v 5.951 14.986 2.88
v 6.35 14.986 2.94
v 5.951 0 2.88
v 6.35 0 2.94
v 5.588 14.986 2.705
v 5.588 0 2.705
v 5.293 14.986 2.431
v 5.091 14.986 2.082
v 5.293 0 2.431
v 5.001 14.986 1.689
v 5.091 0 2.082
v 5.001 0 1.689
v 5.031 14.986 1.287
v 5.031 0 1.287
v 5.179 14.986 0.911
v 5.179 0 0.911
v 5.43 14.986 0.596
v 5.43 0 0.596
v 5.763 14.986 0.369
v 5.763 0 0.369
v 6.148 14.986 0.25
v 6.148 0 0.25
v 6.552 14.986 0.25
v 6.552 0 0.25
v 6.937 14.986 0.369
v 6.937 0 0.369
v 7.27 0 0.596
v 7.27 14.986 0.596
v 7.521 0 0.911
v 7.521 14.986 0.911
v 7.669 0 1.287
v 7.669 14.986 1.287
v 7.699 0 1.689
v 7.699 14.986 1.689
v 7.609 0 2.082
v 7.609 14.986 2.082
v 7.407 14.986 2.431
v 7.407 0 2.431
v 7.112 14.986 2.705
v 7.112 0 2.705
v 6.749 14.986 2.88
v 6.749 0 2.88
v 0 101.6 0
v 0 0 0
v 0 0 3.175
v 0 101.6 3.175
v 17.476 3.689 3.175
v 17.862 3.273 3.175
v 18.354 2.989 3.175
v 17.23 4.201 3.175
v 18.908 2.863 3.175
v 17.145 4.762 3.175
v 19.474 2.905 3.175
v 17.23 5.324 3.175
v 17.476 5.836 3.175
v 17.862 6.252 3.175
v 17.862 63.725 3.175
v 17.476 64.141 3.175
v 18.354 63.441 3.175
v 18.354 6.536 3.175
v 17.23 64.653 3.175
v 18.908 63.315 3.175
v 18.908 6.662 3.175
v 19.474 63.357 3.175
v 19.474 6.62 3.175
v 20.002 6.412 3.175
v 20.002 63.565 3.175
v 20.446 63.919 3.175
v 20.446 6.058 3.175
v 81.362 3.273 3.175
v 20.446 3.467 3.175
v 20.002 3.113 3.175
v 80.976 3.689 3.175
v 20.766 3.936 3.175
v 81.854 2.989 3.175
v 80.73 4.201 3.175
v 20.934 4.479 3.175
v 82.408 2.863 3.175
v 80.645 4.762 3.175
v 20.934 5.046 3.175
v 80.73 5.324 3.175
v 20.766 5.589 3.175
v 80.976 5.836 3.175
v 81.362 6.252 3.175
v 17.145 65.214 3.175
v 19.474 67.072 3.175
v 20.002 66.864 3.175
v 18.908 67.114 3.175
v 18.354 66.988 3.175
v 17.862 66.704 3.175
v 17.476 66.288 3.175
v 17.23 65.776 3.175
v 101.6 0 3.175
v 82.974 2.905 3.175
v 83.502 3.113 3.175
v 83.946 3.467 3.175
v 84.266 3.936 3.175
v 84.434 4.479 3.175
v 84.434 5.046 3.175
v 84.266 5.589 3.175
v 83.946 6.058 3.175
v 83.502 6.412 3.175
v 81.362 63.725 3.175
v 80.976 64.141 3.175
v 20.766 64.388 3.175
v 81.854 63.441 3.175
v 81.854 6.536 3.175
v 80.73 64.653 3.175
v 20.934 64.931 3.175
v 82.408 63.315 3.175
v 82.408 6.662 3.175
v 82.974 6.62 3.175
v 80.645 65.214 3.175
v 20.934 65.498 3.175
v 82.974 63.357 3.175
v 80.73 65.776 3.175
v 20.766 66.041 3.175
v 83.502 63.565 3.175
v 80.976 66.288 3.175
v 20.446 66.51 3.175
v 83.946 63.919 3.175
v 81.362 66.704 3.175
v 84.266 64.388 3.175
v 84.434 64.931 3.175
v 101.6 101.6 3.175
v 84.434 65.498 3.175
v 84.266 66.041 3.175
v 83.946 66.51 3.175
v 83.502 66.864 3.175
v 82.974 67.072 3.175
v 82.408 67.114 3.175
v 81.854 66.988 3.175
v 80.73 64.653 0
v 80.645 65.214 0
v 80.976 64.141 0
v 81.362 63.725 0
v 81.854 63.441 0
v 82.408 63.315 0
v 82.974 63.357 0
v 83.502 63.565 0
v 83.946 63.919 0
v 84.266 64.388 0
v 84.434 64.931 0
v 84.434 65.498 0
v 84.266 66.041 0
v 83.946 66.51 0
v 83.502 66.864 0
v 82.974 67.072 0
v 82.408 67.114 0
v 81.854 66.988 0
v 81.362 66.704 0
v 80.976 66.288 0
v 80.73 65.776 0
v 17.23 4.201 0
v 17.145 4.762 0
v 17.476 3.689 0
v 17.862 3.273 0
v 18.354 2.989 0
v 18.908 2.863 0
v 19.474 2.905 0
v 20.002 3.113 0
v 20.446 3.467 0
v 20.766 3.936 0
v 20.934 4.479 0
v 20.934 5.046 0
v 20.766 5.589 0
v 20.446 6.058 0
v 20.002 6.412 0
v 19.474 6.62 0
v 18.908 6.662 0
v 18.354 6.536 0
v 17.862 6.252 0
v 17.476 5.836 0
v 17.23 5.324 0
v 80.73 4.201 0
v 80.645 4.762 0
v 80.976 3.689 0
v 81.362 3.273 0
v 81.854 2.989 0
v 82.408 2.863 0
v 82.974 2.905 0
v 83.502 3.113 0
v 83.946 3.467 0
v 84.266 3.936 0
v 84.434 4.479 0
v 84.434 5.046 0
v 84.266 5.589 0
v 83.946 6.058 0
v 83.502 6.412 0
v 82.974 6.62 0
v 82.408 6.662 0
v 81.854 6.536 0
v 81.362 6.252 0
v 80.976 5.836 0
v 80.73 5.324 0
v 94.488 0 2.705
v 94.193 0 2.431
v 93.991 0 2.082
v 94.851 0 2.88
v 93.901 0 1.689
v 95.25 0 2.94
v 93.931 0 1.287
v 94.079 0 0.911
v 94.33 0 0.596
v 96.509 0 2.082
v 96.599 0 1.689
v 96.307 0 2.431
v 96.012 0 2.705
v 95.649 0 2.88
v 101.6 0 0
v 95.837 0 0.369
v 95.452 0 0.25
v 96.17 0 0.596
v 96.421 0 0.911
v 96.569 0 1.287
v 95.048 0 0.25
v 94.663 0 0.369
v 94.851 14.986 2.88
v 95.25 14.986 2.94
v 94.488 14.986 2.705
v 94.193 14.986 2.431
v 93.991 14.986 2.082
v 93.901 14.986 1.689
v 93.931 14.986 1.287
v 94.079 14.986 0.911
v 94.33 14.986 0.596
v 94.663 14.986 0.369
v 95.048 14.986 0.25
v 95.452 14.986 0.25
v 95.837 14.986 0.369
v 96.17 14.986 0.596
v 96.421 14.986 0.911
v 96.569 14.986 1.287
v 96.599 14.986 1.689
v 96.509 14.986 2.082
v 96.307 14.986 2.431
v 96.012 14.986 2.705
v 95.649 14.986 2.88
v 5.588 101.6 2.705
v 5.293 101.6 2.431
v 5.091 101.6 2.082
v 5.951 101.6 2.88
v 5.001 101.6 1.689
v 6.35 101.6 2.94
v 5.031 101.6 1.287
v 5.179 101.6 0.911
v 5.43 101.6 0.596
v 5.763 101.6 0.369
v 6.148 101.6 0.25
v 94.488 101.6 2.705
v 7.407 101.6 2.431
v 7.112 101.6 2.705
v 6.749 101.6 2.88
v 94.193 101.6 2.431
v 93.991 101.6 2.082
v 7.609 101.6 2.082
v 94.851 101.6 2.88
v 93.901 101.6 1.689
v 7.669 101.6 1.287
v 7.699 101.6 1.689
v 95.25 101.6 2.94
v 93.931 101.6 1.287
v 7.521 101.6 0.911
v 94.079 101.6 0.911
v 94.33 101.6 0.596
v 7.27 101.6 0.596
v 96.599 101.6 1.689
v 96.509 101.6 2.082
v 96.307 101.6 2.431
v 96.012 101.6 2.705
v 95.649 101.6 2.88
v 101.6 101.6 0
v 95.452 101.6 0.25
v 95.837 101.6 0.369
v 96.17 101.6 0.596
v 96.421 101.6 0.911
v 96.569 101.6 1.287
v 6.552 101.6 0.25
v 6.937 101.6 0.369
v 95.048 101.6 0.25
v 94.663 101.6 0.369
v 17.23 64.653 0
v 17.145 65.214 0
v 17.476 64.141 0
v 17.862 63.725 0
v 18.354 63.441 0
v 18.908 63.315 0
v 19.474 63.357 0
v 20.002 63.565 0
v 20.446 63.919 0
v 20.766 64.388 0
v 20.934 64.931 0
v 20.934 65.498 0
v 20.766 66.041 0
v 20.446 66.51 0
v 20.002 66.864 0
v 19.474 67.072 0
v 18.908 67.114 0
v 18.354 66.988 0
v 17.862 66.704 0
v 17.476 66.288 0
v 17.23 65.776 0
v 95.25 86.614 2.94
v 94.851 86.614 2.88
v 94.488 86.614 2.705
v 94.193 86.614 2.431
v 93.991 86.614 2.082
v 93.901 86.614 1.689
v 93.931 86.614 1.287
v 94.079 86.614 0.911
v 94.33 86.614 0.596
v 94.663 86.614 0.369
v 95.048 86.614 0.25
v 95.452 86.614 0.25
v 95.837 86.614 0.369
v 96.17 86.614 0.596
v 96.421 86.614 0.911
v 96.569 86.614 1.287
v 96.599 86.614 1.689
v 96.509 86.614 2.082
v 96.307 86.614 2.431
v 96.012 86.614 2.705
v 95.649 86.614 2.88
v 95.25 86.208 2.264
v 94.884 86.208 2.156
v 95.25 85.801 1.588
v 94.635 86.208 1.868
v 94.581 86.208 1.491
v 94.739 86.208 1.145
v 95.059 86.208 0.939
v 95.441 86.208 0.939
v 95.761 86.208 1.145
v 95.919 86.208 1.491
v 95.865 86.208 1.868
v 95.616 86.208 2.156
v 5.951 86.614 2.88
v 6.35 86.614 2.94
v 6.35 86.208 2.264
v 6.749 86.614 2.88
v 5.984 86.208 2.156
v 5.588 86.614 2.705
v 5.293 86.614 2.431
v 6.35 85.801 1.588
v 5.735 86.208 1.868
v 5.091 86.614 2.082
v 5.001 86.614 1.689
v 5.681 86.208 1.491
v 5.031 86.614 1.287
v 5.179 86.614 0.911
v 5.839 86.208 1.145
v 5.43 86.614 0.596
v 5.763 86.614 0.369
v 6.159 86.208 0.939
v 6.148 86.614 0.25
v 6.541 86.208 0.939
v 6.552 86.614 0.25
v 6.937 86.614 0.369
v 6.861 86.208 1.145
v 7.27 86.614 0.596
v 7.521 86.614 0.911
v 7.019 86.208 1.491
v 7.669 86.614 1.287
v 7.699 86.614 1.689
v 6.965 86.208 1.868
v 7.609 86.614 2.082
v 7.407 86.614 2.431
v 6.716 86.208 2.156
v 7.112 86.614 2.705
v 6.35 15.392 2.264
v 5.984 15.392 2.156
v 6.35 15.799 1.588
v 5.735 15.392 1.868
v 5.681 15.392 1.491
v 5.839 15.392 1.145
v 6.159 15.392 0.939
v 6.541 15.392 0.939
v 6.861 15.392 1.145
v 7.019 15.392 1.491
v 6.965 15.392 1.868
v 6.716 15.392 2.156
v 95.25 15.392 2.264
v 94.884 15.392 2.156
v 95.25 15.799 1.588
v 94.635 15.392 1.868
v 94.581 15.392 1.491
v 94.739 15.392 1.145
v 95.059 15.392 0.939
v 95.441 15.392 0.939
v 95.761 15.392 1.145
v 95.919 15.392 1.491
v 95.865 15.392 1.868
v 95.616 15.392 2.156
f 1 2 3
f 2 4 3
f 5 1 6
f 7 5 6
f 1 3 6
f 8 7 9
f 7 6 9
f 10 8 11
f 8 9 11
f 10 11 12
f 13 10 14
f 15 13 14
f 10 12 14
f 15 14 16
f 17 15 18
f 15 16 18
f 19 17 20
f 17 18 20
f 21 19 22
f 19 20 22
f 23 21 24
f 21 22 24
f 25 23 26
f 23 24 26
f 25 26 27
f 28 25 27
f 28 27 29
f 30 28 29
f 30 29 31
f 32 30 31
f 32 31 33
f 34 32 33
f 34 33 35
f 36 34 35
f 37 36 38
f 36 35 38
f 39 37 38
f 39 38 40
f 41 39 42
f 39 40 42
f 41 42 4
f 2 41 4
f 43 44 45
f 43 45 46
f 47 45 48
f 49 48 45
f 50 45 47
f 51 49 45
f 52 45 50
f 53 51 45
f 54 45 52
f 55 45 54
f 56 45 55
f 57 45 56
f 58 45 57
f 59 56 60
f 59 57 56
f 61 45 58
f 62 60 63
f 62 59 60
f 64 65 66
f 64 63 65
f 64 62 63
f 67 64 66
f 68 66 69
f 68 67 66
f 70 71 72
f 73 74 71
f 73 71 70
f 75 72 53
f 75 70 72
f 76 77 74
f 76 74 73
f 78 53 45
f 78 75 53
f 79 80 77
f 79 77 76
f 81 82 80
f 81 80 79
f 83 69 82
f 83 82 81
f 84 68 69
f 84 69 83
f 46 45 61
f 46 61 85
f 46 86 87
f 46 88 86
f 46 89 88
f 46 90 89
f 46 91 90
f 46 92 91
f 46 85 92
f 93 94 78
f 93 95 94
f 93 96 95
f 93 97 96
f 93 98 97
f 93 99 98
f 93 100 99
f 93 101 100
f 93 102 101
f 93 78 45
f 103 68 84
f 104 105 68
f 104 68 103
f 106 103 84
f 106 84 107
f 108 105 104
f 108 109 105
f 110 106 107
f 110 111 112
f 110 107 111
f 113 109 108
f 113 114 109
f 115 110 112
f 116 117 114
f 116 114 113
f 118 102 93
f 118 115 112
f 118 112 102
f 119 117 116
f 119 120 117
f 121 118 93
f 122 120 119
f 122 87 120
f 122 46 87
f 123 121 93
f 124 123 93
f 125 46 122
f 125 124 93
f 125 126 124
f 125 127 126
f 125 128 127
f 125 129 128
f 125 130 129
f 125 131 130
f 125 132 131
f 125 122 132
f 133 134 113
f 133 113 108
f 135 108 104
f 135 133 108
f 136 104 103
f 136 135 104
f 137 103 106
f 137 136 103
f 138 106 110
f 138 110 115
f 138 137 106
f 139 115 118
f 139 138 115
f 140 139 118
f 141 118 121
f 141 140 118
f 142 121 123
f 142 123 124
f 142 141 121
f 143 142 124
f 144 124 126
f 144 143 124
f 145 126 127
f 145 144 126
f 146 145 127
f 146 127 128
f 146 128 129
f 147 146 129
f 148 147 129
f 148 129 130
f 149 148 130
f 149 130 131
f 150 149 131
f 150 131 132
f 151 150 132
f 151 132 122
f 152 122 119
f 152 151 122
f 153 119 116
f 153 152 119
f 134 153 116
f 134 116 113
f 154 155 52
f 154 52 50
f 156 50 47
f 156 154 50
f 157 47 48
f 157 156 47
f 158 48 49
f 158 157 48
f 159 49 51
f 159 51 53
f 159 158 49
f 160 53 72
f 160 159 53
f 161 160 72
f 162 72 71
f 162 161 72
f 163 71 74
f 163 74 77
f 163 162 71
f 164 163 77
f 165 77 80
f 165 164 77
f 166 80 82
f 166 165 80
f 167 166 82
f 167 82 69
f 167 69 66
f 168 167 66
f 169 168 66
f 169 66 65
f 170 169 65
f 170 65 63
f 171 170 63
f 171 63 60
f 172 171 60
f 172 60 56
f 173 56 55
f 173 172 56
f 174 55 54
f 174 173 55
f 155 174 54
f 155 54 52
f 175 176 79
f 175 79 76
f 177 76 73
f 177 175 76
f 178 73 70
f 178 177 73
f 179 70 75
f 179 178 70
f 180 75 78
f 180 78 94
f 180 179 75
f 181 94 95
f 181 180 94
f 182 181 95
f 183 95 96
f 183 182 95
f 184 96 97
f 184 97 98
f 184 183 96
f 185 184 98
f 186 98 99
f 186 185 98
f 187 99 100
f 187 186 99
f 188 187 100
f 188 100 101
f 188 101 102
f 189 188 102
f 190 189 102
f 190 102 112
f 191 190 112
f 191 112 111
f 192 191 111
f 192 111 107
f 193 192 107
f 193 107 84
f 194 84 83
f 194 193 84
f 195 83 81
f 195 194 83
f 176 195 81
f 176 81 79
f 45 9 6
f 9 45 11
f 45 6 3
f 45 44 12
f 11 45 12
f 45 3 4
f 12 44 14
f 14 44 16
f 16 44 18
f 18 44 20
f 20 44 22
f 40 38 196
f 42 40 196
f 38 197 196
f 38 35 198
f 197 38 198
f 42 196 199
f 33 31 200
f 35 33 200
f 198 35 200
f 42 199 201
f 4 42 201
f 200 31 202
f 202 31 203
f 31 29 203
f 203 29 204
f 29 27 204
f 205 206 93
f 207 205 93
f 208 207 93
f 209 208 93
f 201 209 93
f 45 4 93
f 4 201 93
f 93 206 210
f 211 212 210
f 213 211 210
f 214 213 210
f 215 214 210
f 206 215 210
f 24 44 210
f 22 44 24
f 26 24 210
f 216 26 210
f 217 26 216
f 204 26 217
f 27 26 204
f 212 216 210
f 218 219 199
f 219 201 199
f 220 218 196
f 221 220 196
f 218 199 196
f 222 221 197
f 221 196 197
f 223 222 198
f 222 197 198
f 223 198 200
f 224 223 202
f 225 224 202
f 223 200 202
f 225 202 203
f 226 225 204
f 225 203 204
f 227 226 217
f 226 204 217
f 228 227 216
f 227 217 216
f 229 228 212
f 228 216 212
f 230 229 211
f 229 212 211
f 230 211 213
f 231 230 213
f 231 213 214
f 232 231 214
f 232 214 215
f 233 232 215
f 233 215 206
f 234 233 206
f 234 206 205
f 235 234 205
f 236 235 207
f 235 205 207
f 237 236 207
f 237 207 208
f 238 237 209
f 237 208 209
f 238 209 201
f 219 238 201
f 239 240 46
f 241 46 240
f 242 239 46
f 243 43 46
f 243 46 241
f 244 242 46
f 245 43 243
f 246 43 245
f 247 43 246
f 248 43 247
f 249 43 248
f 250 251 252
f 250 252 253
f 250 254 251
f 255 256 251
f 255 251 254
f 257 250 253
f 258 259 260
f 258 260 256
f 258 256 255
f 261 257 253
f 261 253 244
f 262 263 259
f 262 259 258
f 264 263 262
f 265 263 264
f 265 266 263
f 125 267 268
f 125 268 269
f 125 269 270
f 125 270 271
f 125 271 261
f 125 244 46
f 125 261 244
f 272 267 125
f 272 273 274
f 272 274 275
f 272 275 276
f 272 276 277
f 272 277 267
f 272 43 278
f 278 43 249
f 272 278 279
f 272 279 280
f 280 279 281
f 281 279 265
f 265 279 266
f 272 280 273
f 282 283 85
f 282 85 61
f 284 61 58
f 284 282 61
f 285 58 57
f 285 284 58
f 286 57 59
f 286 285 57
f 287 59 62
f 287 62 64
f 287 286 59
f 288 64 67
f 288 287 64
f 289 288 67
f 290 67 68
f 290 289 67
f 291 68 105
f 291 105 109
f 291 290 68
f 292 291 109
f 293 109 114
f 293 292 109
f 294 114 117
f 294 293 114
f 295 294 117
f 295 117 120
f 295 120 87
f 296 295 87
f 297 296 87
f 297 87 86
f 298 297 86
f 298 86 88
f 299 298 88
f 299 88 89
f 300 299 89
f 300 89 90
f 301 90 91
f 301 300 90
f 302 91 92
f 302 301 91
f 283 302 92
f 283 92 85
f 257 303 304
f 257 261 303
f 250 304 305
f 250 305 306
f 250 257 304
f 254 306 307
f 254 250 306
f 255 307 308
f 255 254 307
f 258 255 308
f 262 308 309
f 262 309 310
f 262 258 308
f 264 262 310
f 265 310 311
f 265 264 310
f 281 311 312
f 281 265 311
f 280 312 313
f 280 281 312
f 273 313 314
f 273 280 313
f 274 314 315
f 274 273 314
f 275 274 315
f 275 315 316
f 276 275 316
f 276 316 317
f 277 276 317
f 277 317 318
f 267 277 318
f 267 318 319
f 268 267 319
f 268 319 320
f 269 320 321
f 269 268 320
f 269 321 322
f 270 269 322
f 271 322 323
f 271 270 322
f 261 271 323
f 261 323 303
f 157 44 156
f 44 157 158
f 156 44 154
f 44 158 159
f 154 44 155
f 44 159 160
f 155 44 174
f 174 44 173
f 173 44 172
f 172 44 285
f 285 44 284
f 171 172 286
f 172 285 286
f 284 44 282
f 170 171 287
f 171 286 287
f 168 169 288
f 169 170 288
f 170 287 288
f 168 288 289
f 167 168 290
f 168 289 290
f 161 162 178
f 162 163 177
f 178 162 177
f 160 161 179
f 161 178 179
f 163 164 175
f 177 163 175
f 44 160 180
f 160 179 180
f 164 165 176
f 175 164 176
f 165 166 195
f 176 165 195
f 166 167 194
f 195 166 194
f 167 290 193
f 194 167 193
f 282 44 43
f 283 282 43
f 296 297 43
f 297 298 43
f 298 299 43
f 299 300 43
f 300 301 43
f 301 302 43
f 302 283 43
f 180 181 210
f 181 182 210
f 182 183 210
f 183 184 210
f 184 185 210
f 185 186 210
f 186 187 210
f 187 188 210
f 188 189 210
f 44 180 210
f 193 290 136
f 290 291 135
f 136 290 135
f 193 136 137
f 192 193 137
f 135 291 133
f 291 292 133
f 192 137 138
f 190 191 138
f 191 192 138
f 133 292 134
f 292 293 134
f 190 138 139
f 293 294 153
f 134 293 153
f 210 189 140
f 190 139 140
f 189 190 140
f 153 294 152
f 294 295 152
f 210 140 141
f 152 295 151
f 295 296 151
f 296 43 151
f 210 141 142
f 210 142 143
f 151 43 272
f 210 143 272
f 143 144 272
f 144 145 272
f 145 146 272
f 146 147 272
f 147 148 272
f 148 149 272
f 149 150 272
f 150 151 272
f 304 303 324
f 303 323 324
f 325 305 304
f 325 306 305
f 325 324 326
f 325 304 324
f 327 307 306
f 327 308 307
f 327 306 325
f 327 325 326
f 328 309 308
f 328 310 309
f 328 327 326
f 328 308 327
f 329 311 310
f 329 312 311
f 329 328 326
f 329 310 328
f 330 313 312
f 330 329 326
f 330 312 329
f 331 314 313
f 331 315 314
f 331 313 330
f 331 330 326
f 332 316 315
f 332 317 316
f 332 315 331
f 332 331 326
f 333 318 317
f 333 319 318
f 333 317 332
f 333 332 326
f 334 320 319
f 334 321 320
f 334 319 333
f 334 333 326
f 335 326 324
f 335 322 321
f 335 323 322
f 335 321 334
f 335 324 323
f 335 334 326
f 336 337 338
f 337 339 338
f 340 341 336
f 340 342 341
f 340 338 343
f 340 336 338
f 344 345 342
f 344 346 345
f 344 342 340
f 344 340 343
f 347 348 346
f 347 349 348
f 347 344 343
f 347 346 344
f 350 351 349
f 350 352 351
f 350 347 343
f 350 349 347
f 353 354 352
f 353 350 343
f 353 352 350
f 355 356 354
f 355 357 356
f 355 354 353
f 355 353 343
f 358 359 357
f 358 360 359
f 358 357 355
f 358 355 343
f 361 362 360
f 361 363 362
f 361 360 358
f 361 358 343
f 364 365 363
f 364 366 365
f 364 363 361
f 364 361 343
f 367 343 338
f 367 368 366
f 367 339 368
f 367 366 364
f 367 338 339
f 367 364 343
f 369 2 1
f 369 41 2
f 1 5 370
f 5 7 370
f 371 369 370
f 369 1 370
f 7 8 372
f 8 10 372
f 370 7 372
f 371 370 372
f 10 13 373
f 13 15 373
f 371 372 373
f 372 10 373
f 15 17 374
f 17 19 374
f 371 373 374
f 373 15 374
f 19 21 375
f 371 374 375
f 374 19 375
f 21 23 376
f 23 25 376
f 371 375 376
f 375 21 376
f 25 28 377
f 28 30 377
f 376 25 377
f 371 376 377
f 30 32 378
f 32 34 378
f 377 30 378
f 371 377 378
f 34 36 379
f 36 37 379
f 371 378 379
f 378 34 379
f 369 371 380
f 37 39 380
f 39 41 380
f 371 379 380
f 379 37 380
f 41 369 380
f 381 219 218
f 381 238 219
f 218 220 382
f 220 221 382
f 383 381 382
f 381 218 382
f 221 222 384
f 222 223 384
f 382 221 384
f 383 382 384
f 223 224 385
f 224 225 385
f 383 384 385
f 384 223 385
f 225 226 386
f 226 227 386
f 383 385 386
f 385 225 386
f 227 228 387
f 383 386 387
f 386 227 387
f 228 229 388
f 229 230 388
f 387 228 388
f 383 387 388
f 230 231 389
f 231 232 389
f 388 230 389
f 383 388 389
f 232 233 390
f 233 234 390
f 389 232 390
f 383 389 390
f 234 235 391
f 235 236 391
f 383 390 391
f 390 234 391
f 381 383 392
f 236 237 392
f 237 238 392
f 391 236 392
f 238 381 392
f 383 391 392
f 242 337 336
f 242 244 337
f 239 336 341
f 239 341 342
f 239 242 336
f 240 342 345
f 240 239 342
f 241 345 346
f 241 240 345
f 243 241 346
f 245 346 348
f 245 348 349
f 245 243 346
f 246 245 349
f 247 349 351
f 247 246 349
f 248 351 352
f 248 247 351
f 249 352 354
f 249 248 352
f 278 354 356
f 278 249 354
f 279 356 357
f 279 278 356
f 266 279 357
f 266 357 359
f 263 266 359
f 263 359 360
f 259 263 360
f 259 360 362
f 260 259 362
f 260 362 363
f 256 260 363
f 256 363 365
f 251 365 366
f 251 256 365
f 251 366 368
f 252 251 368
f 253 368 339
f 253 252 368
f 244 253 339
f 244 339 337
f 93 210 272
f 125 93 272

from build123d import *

# Parameters (mm, degrees)
SKETCH1_W                      = 101.6
SKETCH1_H                      = 101.6
BOSS_EXTRUDE1_DEPTH            = 3.175
F_6_32_TAPPED_HOLE1_AT_2_COUNT = 2
F_6_32_TAPPED_HOLE1_AT_2_PITCH = 88.9
CUT_EXTRUDE2_REACH             = 148.894
CUT_EXTRUDE2_START             = 3.175
SKETCH8_R                      = 1.905


with BuildPart() as part:
    # Sketch1 → Boss-Extrude1 (new body)
    with BuildSketch(Plane.XY):
        with Locations((50.8, 50.8)):
            Rectangle(SKETCH1_W, SKETCH1_H)
    extrude(amount=BOSS_EXTRUDE1_DEPTH)

    # Sketch7 → #6-32 Tapped Hole1 (revolve, cut)
    with BuildSketch(Plane(origin=(95.25, 101.6, 1.5875), x_dir=(0, 0, 1), z_dir=(1, 0, 0))):
        Polygon((0, 0), (0, 15.79869403), (1.35255, 14.986), (1.35255, 0), align=None)
    f_6_32_tapped_hole1 = revolve(axis=Axis((95.25, 107.95, 1.5875), (0, -1, 0)), mode=Mode.SUBTRACT)

    # #6-32 Tapped Hole1 at 2: #6-32 Tapped Hole1 ×2
    with Locations(*[(-i * F_6_32_TAPPED_HOLE1_AT_2_PITCH, 0, 0) for i in range(1, F_6_32_TAPPED_HOLE1_AT_2_COUNT)]):
        add(f_6_32_tapped_hole1, mode=Mode.SUBTRACT)

    # Mirror1: #6-32 Tapped Hole1 across plane
    add(f_6_32_tapped_hole1.mirror(Plane(origin=(0, 50.8, 0), x_dir=(0, 0, 1), z_dir=(0, -1, 0))), mode=Mode.SUBTRACT)

    # Mirror1 copy 1 sketch → Mirror1 copy 1 (revolve, cut)
    with BuildSketch(Plane(origin=(6.35, 0, 1.5875), x_dir=(0, 0, 1), z_dir=(1, 0, 0))):
        Polygon((0, 0), (0, -15.79869403), (1.35255, -14.986), (1.35255, 0), align=None)
    revolve(axis=Axis((6.35, -6.35, 1.5875), (0, -1, 0)), mode=Mode.SUBTRACT)

    # Sketch8 → Cut-Extrude2 (cut, up to next)
    with BuildSketch(Plane.XY.offset(CUT_EXTRUDE2_START), mode=Mode.PRIVATE) as cut_extrude2_sk1:
        with Locations((19.05, 65.2145)):
            Circle(SKETCH8_R)
    cut_extrude2_tool1 = extrude(cut_extrude2_sk1.sketch, amount=-CUT_EXTRUDE2_REACH, mode=Mode.PRIVATE) & part.part
    # Sketch8 → Cut-Extrude2 (cut, up to next)
    with BuildSketch(Plane.XY.offset(CUT_EXTRUDE2_START), mode=Mode.PRIVATE) as cut_extrude2_sk2:
        with Locations((19.05, 4.7625)):
            Circle(SKETCH8_R)
    cut_extrude2_tool2 = extrude(cut_extrude2_sk2.sketch, amount=-CUT_EXTRUDE2_REACH, mode=Mode.PRIVATE) & part.part
    # Sketch8 → Cut-Extrude2 (cut, up to next)
    with BuildSketch(Plane.XY.offset(CUT_EXTRUDE2_START), mode=Mode.PRIVATE) as cut_extrude2_sk3:
        with Locations((82.55, 4.7625)):
            Circle(SKETCH8_R)
    cut_extrude2_tool3 = extrude(cut_extrude2_sk3.sketch, amount=-CUT_EXTRUDE2_REACH, mode=Mode.PRIVATE) & part.part
    # Sketch8 → Cut-Extrude2 (cut, up to next)
    with BuildSketch(Plane.XY.offset(CUT_EXTRUDE2_START), mode=Mode.PRIVATE) as cut_extrude2_sk4:
        with Locations((82.55, 65.2145)):
            Circle(SKETCH8_R)
    cut_extrude2_tool4 = extrude(cut_extrude2_sk4.sketch, amount=-CUT_EXTRUDE2_REACH, mode=Mode.PRIVATE) & part.part
    add(cut_extrude2_tool1.solids().sort_by_distance((19.05, 65.2145, 3.175))[0], mode=Mode.SUBTRACT)
    add(cut_extrude2_tool2.solids().sort_by_distance((19.05, 4.7625, 3.175))[0], mode=Mode.SUBTRACT)
    add(cut_extrude2_tool3.solids().sort_by_distance((82.55, 4.7625, 3.175))[0], mode=Mode.SUBTRACT)
    add(cut_extrude2_tool4.solids().sort_by_distance((82.55, 65.2145, 3.175))[0], mode=Mode.SUBTRACT)


solid = part.part
